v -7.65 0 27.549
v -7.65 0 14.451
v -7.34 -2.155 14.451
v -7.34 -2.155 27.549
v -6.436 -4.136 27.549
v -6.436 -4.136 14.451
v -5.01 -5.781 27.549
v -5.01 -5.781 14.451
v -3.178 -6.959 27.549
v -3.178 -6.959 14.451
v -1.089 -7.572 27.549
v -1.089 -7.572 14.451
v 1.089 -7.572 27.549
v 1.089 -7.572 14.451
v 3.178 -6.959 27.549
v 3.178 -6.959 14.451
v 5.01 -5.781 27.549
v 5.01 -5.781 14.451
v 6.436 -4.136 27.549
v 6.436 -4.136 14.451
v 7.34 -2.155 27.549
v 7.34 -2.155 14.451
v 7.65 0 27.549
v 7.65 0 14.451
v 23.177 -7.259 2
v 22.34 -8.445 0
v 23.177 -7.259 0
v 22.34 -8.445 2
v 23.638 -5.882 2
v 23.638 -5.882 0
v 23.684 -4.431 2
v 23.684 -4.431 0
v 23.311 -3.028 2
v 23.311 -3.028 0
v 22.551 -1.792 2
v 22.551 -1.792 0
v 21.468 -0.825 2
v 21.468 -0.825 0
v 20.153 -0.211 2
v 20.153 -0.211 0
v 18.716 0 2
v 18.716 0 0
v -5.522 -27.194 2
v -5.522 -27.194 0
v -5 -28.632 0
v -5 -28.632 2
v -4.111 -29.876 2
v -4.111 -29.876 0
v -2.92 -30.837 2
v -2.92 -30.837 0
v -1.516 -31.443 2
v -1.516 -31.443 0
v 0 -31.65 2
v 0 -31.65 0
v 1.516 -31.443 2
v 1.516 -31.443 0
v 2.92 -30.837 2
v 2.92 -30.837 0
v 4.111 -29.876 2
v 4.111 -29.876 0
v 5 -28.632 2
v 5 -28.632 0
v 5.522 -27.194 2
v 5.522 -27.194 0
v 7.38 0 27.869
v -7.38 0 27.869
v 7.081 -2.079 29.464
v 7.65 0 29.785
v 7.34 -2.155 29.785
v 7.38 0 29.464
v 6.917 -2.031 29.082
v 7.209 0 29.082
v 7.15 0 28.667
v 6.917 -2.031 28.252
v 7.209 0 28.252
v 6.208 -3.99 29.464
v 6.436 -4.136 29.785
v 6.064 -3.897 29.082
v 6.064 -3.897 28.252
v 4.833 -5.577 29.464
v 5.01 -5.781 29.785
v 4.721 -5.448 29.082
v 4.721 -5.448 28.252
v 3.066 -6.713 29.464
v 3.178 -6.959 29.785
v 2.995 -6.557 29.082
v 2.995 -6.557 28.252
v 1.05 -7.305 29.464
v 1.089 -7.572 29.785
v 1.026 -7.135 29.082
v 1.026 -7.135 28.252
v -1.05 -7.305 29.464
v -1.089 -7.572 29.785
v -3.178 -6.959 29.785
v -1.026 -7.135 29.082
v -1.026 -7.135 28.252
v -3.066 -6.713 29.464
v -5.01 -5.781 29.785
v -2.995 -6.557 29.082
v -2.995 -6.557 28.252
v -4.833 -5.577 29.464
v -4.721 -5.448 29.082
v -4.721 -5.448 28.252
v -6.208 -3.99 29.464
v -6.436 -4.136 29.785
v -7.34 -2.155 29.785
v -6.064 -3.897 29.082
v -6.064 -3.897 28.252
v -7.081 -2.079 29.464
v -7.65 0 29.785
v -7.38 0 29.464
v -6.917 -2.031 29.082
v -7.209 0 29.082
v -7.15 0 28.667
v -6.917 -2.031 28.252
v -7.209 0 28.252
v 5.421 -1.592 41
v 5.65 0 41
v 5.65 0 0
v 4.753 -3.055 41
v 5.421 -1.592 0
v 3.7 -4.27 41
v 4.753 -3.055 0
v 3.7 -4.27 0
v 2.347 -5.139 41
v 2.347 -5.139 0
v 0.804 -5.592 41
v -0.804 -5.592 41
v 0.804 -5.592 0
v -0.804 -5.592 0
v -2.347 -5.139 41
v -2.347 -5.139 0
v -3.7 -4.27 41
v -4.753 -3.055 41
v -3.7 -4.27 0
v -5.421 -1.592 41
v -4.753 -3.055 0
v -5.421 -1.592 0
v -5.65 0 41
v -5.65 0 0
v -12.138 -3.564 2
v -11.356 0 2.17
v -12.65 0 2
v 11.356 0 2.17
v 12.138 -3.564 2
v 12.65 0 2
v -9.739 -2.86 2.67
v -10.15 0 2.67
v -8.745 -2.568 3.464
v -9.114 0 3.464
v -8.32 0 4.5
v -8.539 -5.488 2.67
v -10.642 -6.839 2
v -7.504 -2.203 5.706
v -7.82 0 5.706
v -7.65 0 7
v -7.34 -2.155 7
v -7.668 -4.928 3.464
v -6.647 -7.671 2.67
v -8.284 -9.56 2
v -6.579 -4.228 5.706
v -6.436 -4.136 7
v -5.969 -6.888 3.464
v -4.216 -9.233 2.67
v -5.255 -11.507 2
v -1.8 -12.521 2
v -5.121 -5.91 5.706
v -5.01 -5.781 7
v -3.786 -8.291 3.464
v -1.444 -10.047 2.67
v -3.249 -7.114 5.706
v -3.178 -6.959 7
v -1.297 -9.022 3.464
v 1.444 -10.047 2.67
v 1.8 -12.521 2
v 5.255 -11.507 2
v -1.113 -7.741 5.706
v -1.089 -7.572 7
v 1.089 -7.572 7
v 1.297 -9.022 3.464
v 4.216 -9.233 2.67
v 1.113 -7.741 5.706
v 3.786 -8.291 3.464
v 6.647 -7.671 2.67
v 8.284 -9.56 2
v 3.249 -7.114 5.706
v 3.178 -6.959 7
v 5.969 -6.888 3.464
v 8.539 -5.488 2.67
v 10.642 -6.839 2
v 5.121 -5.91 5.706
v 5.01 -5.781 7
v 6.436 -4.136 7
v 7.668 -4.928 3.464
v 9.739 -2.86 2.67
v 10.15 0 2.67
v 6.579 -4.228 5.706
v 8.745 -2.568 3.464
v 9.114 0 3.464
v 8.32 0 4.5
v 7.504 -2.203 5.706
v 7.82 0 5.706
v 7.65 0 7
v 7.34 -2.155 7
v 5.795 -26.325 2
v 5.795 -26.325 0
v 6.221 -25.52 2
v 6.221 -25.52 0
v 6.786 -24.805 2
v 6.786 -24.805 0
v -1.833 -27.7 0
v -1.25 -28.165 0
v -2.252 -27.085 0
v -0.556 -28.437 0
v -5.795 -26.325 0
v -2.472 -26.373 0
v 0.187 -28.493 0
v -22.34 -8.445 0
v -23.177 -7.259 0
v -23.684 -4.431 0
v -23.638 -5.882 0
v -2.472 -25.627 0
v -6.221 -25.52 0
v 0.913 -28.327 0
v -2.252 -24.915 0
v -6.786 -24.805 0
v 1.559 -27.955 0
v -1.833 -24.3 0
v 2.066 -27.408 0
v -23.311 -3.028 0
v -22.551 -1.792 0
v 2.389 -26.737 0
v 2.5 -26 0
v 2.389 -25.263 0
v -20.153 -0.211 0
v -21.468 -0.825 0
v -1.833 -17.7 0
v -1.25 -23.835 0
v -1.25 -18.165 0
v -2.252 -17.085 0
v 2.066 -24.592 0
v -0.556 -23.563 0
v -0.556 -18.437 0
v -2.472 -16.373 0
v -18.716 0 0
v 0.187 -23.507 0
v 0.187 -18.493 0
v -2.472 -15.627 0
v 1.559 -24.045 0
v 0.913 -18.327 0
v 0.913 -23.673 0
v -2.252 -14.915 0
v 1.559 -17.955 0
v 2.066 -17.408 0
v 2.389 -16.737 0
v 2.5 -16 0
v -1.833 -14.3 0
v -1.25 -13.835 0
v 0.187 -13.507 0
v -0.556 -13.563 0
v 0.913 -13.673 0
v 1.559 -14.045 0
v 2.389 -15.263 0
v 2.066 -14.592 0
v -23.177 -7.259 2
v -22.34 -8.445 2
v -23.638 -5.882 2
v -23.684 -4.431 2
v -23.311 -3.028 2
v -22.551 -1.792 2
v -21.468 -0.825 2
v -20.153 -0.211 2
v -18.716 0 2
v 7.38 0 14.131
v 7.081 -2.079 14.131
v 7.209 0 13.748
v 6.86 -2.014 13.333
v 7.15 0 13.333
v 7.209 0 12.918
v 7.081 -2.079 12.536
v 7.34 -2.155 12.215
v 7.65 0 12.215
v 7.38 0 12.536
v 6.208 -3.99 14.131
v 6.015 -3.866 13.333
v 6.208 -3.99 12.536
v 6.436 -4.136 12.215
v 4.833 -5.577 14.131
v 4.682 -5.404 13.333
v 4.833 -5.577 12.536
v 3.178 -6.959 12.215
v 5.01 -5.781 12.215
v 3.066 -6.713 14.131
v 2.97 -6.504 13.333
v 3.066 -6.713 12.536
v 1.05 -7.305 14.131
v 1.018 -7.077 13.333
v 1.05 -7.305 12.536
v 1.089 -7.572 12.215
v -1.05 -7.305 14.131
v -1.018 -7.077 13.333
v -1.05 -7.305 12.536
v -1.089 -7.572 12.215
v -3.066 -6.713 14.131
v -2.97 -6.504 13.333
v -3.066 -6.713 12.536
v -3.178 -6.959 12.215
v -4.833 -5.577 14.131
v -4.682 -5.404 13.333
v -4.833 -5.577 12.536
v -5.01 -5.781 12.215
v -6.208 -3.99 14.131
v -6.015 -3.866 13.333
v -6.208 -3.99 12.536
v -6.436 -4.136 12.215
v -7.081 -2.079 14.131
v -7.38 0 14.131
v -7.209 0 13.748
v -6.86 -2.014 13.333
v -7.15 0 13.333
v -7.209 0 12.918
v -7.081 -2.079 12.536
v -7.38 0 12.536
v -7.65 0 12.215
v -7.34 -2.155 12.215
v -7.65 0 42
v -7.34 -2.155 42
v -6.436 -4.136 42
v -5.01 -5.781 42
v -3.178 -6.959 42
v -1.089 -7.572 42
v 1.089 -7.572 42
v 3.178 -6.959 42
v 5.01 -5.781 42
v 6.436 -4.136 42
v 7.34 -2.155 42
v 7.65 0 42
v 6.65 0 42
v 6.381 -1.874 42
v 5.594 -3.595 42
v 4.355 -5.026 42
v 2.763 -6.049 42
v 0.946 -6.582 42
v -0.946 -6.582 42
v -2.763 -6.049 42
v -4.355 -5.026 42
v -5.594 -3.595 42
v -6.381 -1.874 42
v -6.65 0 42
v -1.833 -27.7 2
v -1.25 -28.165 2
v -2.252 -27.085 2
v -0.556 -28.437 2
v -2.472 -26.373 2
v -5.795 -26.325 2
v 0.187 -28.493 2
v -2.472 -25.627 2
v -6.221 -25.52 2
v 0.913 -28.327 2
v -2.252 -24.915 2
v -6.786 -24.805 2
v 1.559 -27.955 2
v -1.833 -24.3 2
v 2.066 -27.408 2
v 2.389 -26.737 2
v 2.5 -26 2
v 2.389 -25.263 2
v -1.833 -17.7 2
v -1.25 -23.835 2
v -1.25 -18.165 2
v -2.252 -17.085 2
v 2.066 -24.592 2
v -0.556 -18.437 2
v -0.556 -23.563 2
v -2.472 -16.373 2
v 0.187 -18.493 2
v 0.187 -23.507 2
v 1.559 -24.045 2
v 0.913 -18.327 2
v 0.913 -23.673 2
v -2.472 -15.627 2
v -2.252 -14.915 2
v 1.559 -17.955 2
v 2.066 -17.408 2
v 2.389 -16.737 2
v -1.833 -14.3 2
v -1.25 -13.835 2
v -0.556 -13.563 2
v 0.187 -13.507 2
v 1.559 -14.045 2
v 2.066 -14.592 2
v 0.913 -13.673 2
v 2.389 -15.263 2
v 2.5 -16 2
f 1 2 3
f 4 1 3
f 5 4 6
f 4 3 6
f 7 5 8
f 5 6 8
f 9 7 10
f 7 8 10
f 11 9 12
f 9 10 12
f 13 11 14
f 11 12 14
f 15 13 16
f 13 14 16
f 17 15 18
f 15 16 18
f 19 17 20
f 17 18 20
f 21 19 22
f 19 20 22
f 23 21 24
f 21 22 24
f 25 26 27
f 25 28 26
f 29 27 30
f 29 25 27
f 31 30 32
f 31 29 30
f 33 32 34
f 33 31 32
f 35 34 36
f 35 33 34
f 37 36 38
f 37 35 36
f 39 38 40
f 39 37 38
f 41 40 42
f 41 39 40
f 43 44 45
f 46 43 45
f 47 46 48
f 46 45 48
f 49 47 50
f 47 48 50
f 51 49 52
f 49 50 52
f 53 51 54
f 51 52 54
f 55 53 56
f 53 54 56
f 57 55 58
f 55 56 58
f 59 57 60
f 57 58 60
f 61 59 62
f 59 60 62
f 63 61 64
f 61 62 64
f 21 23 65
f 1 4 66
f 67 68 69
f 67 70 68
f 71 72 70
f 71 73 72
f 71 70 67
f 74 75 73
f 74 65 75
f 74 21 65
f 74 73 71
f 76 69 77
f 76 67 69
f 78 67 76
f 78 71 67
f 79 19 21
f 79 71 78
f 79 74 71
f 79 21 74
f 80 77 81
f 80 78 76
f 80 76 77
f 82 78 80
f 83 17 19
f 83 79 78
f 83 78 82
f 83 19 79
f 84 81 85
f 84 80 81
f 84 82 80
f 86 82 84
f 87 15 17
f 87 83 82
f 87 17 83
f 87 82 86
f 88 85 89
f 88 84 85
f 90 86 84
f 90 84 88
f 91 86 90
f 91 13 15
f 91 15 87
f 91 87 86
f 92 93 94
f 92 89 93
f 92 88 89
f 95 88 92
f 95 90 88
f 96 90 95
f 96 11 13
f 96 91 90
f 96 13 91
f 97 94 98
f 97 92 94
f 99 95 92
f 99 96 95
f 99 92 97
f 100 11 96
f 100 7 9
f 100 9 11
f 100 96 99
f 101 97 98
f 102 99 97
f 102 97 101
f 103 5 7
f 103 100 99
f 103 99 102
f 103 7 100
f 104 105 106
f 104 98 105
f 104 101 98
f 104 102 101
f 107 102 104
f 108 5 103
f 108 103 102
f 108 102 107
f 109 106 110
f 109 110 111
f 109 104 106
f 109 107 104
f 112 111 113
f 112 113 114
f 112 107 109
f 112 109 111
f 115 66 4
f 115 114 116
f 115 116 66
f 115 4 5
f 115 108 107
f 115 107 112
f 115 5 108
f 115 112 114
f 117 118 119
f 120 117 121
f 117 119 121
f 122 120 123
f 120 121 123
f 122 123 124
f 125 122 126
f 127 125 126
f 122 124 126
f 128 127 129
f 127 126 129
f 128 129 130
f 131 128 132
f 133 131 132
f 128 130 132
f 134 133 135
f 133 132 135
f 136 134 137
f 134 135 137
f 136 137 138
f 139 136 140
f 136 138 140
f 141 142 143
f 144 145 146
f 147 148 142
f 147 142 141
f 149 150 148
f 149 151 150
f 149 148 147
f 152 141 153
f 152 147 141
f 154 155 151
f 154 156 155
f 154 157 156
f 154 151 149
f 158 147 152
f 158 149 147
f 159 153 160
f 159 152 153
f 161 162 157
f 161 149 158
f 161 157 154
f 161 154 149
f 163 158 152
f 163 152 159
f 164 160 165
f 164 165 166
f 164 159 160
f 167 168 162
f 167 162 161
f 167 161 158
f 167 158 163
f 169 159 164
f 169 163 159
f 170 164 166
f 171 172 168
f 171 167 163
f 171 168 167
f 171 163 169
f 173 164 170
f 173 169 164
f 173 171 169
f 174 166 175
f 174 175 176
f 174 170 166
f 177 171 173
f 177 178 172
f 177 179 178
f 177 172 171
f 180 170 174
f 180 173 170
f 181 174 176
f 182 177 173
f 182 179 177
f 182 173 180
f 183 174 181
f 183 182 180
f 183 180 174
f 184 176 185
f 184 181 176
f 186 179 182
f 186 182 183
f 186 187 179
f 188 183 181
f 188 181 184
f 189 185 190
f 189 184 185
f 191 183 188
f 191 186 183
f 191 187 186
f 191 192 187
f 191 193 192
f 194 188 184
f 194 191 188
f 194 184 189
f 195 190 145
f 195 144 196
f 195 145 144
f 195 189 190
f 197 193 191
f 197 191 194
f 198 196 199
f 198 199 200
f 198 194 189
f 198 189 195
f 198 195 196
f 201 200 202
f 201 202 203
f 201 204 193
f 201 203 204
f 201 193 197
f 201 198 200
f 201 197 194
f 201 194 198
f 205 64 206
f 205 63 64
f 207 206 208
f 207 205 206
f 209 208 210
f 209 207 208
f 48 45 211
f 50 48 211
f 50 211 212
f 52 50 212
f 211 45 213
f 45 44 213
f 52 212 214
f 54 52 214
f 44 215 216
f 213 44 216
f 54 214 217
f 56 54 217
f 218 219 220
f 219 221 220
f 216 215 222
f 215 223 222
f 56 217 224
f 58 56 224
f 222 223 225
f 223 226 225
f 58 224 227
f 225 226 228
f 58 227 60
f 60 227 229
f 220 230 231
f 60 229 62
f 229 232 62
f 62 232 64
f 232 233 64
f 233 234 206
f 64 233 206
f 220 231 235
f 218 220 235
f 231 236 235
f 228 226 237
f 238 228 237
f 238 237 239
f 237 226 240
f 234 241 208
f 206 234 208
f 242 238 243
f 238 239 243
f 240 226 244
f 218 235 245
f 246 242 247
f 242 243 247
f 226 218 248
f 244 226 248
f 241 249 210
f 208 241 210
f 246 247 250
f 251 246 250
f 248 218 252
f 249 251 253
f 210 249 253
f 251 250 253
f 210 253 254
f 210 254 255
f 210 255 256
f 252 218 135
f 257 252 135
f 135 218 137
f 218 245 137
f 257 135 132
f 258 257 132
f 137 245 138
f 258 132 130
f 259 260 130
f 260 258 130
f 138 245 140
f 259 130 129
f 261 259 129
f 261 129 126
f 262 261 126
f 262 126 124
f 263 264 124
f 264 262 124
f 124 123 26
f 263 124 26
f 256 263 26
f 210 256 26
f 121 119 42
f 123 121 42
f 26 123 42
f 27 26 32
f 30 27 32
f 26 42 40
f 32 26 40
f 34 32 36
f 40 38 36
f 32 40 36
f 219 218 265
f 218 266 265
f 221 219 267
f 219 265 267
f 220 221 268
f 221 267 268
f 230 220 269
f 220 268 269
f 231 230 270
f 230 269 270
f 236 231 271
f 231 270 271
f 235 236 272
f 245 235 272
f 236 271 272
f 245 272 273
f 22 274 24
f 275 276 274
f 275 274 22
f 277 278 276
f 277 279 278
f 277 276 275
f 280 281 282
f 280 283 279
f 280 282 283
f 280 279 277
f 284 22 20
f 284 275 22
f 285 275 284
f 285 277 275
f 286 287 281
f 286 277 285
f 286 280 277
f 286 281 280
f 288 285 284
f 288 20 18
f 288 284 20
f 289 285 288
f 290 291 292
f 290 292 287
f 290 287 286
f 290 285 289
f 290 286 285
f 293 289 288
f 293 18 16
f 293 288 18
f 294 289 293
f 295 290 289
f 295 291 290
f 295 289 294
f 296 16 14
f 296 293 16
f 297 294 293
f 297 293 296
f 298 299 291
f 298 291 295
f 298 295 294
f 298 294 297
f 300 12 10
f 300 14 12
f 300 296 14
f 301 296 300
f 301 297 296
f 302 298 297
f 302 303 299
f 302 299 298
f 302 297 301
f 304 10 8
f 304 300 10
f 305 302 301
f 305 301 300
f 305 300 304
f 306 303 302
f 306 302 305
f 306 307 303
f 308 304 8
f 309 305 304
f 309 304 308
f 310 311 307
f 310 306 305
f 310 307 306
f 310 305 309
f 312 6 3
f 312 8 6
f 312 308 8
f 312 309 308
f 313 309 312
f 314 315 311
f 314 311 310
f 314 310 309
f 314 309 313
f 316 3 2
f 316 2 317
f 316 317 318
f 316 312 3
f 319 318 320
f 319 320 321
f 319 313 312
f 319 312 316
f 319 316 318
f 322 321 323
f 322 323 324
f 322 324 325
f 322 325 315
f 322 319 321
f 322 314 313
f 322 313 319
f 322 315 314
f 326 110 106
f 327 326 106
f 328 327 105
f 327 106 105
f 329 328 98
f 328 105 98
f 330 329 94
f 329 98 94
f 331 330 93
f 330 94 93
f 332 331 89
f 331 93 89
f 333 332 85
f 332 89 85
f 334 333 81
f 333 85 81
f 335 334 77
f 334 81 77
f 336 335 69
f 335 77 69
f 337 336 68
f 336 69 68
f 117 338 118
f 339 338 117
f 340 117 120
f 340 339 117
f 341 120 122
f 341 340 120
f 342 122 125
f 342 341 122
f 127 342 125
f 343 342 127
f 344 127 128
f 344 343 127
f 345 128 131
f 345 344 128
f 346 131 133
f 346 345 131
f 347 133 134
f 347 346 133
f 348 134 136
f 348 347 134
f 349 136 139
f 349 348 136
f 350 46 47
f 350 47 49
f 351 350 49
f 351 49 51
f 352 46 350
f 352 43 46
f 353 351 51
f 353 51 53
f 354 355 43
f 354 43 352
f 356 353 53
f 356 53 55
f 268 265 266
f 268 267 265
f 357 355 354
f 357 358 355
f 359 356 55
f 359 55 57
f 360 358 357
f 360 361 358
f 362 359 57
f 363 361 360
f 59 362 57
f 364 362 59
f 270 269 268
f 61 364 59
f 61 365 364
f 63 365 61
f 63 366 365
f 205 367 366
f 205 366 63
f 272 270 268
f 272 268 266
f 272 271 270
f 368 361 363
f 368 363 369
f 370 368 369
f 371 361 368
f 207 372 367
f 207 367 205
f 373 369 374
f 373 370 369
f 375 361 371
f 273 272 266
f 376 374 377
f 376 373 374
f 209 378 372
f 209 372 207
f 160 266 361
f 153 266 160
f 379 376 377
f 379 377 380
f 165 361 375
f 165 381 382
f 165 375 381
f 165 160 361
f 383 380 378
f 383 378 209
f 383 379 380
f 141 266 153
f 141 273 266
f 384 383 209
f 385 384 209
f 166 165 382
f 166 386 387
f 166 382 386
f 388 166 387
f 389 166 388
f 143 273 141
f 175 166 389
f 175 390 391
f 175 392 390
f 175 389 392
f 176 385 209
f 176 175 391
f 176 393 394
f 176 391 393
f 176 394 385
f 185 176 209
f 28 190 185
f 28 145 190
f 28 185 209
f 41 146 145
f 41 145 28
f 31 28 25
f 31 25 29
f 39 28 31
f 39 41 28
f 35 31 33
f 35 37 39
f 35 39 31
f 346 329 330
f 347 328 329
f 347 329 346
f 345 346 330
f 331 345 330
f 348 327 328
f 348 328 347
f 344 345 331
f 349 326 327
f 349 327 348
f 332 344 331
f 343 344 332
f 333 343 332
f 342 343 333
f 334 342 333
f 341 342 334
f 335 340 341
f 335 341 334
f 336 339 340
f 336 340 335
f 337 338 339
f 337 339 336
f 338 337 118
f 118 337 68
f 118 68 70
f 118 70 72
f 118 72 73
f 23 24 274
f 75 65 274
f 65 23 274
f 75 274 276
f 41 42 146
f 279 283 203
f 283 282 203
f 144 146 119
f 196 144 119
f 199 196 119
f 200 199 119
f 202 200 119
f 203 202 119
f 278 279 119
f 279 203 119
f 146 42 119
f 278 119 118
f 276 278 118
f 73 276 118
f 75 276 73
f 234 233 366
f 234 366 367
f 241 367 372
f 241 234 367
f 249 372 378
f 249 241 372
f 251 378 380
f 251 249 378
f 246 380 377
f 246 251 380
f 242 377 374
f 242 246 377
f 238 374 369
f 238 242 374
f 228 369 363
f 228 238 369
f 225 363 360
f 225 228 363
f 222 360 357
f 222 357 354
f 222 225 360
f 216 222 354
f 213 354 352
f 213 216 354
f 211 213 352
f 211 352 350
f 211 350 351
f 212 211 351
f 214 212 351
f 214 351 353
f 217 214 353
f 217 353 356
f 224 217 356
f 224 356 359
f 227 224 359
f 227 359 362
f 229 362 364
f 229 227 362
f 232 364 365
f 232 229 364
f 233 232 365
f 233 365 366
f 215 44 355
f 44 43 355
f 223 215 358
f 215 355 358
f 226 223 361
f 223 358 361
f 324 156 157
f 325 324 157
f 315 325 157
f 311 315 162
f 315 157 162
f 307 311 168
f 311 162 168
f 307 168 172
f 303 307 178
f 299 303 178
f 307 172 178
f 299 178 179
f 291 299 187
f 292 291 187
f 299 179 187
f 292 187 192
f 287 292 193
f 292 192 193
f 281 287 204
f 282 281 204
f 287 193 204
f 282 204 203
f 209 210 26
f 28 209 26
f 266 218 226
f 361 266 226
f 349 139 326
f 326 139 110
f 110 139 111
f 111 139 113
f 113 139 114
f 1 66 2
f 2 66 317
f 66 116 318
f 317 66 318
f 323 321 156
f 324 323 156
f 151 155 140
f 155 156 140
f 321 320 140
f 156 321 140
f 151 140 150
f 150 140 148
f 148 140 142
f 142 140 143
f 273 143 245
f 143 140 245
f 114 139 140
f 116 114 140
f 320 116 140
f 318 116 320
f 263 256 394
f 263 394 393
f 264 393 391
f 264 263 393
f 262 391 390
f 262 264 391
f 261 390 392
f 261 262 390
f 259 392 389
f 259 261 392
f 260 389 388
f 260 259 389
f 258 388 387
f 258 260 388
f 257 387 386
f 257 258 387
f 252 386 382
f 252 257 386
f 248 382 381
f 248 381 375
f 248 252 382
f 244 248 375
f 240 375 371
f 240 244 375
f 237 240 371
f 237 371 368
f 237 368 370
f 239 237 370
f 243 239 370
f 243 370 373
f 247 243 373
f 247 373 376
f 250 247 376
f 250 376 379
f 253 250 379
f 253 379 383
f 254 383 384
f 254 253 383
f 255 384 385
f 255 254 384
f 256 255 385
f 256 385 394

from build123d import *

# Parameters (mm, degrees)
F2_R     = 2.5
F3_DEPTH = 2
F5_DEPTH = 40
F6_R     = 5


with BuildPart() as f3:
    # F2 (on Top) → F3 (new body)
    with BuildSketch(Plane.XY):
        with BuildLine():
            ThreePointArc((5.65, 0), (0, -5.65), (-5.65, 0))
            Line((-5.65, 0), (-30.3692883162, 0))
            Line((-30.3692883162, 0), (-5.65, -26))
            ThreePointArc((-5.65, -26), (0, -31.65), (5.65, -26))
            Line((5.65, -26), (30.3692883162, 0))
            Line((30.3692883162, 0), (5.65, 0))
        make_face()
        with Locations((0, -26)):
            Circle(F2_R, mode=Mode.SUBTRACT)
        with Locations((0, -16)):
            Circle(F2_R, mode=Mode.SUBTRACT)
    extrude(amount=F3_DEPTH)

    # F4 (on face) → F5 (join)
    with BuildSketch(Plane.XY.offset(2)):
        with BuildLine():
            ThreePointArc((5.65, 0), (0, -5.65), (-5.65, 0))
            Line((-5.65, 0), (-7.65, 0))
            ThreePointArc((-7.65, 0), (0, -7.65), (7.65, 0))
            Line((7.65, 0), (5.65, 0))
        make_face()
    extrude(amount=F5_DEPTH)

    # F6
    f6_edges = [f3.edges().sort_by_distance(p)[0] for p in [
        (0, -7.65, 2),
        (-30.369288, 0, 1),
        (-5.65, -26, 1),
        (5.65, -26, 1),
        (30.369288, 0, 1),
    ]]
    fillet(f6_edges, radius=F6_R)

    # F7 (on face) → F8 (revolve, cut)
    with BuildSketch(Plane(origin=(0, 0, 0), x_dir=(-1, 0, 0), z_dir=(0, 1, 0))):
        with BuildLine():
            ThreePointArc((8.65, 14.8333333333), (7.15, 13.3333333333), (8.65, 11.8333333333))
            Line((8.65, 11.8333333333), (8.65, 14.8333333333))
        make_face()
        with BuildLine():
            ThreePointArc((8.65, 30.1666666667), (7.15, 28.6666666667), (8.65, 27.1666666667))
            Line((8.65, 27.1666666667), (8.65, 30.1666666667))
        make_face()
        Polygon((5.65, 41), (6.65, 42), (5.65, 42), align=None)
    revolve(axis=Axis((0, 0, 10.5), (0, 0, -1)), mode=Mode.SUBTRACT)


solid = f3.part
